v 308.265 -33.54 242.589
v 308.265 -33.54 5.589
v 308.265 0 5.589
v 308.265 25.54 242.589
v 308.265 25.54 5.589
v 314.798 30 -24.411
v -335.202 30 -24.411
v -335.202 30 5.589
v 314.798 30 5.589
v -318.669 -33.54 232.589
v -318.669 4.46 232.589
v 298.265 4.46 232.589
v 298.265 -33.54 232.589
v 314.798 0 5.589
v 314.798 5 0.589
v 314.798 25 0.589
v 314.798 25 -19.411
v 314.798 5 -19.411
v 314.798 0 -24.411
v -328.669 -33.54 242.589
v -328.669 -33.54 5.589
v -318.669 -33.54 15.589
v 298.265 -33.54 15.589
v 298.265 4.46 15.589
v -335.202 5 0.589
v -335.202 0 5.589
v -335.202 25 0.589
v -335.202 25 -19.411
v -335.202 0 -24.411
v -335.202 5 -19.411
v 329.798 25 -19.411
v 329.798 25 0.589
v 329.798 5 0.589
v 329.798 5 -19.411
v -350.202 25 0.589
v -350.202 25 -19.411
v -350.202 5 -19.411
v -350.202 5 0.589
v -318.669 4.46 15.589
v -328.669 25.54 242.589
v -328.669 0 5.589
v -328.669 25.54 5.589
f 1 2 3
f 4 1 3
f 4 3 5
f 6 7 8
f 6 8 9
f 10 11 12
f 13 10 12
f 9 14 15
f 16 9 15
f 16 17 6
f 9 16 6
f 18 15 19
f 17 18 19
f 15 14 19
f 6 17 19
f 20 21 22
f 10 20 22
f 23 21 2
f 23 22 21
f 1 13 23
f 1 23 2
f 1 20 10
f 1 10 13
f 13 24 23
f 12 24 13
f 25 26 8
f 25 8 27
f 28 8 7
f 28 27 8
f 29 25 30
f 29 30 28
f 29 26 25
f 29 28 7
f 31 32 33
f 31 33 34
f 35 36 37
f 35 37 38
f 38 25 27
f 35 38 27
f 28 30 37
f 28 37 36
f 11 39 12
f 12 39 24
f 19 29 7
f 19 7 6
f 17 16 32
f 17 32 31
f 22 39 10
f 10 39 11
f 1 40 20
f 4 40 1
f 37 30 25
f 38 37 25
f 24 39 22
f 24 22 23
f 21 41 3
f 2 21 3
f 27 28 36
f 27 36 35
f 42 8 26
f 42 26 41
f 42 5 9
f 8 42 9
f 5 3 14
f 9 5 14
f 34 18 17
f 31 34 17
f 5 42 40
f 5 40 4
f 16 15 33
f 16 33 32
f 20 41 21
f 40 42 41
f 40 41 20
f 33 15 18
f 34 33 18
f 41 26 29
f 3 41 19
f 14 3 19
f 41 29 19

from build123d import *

# Parameters (mm, degrees)
SKETCH1_W           = 650
SKETCH1_H           = 30
BOSS_EXTRUDE1_DEPTH = 30
SKETCH2_W           = 20
SKETCH2_H           = 20
BOSS_EXTRUDE2_DEPTH = 15
SKETCH3_W           = 20
SKETCH3_H           = 20
BOSS_EXTRUDE3_DEPTH = 15
SKETCH4_W           = 636.933542964
SKETCH4_H           = 21.079205472
BOSS_EXTRUDE4_DEPTH = 237
SKETCH6_W           = 636.933542964
SKETCH6_H           = 237
SKETCH6_W_2         = 616.933542964
SKETCH6_H_2         = 217
BOSS_EXTRUDE5_DEPTH = 38


with BuildPart() as part:
    # Sketch1 → Boss-Extrude1 (new body)
    with BuildSketch(Plane(origin=(0, 0, 0), x_dir=(1, 0, 0), z_dir=(0, 1, 0))):
        with Locations((-10.201793722, 9.411434978)):
            Rectangle(SKETCH1_W, SKETCH1_H)
    extrude(amount=BOSS_EXTRUDE1_DEPTH)

    # Sketch2 → Boss-Extrude2 (add)
    with BuildSketch(Plane(origin=(314.798206278, 0, 0), x_dir=(0, 0, -1), z_dir=(1, 0, 0))):
        with Locations((9.411434978, 15)):
            Rectangle(SKETCH2_W, SKETCH2_H)
    extrude(amount=BOSS_EXTRUDE2_DEPTH)

    # Sketch3 → Boss-Extrude3 (add)
    with BuildSketch(Plane.ZY.offset(335.201793722)):
        with Locations((-9.411434978, 15)):
            Rectangle(SKETCH3_W, SKETCH3_H)
    extrude(amount=BOSS_EXTRUDE3_DEPTH)

    # Sketch4 → Boss-Extrude4 (add)
    with BuildSketch(Plane.XY.offset(5.588565022)):
        with Locations((-10.201793722, 15)):
            Rectangle(SKETCH4_W, SKETCH4_H)
    extrude(amount=BOSS_EXTRUDE4_DEPTH)

    # Sketch6 → Boss-Extrude5 (add)
    with BuildSketch(Plane.XZ.offset(-4.460397264)):
        with Locations((-10.201793722, 124.088565022)):
            Rectangle(SKETCH6_W, SKETCH6_H)
        with Locations((-10.201793722, 124.088565022)):
            Rectangle(SKETCH6_W_2, SKETCH6_H_2, mode=Mode.SUBTRACT)
    extrude(amount=BOSS_EXTRUDE5_DEPTH)


solid = part.part
